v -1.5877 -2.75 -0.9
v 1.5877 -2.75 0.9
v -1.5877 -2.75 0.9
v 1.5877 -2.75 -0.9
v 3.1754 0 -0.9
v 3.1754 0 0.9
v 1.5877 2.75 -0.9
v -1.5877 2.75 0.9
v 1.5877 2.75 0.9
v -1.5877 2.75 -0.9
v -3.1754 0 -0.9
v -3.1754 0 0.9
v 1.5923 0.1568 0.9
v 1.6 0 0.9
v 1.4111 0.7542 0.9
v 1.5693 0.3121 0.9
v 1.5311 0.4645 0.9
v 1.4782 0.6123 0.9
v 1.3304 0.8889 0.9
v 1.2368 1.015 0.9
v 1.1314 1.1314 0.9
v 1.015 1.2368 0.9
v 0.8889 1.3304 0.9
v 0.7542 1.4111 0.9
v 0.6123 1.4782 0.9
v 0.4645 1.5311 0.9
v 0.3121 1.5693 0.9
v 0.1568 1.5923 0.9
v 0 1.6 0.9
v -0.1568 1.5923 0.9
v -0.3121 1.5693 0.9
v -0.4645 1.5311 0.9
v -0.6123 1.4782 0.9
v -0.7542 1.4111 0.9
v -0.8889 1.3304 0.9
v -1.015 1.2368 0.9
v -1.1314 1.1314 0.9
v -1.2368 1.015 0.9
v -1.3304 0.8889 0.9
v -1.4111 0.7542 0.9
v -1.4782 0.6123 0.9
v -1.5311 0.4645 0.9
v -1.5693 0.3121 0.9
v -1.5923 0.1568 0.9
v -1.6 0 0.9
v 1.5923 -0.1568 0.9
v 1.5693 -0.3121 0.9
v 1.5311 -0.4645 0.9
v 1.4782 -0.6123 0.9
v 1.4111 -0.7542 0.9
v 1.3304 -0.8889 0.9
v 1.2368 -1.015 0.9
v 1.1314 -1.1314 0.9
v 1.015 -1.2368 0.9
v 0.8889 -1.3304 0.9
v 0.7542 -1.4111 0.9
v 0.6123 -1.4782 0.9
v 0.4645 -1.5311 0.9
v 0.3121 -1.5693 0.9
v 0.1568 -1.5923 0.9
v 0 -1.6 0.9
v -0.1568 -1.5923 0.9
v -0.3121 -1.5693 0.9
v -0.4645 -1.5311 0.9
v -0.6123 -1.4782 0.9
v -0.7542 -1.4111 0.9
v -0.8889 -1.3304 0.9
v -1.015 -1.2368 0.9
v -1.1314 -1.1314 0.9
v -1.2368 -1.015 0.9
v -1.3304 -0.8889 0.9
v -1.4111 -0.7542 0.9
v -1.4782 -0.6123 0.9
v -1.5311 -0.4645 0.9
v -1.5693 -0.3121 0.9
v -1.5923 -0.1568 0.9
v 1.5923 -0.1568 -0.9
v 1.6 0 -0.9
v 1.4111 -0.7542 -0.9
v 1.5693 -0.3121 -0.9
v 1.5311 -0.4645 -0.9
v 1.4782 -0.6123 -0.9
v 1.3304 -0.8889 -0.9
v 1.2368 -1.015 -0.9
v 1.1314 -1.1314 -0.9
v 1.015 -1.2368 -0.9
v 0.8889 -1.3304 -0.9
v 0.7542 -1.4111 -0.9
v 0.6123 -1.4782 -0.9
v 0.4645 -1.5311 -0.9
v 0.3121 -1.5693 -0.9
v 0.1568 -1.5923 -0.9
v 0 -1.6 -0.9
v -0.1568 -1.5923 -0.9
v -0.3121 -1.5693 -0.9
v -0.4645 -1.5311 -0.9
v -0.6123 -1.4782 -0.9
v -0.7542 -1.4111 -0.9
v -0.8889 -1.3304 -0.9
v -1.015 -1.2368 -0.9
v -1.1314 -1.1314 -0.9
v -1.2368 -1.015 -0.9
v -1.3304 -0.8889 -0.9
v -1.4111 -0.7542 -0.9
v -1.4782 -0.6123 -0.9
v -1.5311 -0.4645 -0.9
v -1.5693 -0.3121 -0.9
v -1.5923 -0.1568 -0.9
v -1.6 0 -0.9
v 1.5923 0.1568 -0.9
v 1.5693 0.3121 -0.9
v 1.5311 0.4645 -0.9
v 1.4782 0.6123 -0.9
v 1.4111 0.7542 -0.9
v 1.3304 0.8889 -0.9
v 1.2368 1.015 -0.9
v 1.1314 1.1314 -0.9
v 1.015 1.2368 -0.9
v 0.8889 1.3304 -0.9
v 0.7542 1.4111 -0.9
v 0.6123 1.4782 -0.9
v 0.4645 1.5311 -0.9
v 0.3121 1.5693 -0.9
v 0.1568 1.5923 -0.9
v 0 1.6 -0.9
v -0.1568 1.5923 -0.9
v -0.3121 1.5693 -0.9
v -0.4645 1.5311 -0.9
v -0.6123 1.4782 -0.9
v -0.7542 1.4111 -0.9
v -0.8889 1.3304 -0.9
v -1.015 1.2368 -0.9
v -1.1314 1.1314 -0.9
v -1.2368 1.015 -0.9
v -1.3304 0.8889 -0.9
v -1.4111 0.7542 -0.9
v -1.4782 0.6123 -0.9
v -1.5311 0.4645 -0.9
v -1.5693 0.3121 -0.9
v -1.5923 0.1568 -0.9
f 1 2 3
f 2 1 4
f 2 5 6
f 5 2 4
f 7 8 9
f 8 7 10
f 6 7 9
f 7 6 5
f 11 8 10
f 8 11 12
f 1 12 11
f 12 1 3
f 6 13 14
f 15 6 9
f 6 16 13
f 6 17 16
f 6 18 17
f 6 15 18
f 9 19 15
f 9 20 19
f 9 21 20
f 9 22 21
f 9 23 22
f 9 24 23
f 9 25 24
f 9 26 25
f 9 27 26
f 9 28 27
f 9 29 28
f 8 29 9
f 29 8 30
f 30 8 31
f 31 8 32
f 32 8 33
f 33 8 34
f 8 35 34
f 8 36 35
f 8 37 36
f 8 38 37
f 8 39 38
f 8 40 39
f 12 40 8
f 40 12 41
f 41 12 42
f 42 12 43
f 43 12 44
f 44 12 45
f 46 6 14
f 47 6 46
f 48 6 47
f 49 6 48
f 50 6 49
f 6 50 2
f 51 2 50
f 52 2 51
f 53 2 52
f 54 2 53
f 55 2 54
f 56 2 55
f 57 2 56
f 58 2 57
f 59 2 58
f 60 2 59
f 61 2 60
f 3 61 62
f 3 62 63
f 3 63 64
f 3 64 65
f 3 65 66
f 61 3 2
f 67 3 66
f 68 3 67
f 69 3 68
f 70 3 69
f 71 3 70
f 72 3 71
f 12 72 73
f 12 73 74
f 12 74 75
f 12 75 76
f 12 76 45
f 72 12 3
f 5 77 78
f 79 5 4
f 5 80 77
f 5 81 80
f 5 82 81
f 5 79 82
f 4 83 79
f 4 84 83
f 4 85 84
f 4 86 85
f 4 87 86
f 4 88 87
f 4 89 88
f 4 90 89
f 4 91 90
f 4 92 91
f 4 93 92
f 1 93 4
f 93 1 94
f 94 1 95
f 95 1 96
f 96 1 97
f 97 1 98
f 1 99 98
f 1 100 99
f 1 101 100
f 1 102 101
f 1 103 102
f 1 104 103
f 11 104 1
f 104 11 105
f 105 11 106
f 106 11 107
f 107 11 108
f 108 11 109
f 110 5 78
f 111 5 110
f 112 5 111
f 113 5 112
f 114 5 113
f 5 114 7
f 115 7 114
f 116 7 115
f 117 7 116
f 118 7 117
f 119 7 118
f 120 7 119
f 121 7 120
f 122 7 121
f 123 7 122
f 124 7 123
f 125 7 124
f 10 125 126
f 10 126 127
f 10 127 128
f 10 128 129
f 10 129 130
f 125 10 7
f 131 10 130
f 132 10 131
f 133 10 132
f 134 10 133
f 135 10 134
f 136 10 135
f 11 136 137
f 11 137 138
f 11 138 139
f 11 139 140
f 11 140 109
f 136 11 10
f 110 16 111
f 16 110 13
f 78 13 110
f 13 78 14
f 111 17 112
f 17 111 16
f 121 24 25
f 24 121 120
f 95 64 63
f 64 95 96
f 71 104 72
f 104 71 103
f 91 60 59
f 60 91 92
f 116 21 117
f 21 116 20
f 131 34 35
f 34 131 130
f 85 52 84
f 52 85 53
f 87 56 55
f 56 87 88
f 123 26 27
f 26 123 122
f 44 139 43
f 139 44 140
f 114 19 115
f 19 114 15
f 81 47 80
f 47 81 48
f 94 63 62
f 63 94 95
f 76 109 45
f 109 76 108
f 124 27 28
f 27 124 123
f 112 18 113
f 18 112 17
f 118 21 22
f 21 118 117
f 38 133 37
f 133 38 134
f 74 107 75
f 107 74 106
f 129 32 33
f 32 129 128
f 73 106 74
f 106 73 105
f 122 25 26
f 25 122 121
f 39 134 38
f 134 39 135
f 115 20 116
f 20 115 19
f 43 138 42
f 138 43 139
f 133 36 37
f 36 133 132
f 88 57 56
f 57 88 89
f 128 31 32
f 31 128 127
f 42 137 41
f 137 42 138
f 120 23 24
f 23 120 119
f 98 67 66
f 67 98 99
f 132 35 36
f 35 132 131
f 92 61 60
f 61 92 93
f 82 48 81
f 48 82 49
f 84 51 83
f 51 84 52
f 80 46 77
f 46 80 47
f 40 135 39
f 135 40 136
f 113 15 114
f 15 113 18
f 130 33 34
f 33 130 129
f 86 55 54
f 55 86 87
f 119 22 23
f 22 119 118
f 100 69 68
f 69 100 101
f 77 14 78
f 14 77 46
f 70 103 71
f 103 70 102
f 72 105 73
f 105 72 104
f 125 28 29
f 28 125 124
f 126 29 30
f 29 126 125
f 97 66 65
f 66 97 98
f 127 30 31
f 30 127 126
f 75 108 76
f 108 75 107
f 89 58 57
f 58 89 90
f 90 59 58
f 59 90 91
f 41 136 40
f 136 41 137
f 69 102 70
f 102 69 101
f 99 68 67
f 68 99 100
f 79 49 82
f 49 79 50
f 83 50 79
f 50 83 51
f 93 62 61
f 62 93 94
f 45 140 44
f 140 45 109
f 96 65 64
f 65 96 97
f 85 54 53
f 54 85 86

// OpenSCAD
$fn=64;

module hex_prism_across_flats(af=5.5, h=1.8){
    r = af / sqrt(3);
    cylinder(h=h, r=r, center=true, $fn=6);
}

module clearance_hole(d=3.2, h=1.8){
    cylinder(h=h+0.4, d=d, center=true, $fn=64);
}

module thin_hex_nut_m3(af=5.5, thickness=1.8, hole_d=3.2){
    difference(){
        hex_prism_across_flats(af=af, h=thickness);
        clearance_hole(d=hole_d, h=thickness);
    }
}

thin_hex_nut_m3(af=5.5, thickness=1.8, hole_d=3.2);
